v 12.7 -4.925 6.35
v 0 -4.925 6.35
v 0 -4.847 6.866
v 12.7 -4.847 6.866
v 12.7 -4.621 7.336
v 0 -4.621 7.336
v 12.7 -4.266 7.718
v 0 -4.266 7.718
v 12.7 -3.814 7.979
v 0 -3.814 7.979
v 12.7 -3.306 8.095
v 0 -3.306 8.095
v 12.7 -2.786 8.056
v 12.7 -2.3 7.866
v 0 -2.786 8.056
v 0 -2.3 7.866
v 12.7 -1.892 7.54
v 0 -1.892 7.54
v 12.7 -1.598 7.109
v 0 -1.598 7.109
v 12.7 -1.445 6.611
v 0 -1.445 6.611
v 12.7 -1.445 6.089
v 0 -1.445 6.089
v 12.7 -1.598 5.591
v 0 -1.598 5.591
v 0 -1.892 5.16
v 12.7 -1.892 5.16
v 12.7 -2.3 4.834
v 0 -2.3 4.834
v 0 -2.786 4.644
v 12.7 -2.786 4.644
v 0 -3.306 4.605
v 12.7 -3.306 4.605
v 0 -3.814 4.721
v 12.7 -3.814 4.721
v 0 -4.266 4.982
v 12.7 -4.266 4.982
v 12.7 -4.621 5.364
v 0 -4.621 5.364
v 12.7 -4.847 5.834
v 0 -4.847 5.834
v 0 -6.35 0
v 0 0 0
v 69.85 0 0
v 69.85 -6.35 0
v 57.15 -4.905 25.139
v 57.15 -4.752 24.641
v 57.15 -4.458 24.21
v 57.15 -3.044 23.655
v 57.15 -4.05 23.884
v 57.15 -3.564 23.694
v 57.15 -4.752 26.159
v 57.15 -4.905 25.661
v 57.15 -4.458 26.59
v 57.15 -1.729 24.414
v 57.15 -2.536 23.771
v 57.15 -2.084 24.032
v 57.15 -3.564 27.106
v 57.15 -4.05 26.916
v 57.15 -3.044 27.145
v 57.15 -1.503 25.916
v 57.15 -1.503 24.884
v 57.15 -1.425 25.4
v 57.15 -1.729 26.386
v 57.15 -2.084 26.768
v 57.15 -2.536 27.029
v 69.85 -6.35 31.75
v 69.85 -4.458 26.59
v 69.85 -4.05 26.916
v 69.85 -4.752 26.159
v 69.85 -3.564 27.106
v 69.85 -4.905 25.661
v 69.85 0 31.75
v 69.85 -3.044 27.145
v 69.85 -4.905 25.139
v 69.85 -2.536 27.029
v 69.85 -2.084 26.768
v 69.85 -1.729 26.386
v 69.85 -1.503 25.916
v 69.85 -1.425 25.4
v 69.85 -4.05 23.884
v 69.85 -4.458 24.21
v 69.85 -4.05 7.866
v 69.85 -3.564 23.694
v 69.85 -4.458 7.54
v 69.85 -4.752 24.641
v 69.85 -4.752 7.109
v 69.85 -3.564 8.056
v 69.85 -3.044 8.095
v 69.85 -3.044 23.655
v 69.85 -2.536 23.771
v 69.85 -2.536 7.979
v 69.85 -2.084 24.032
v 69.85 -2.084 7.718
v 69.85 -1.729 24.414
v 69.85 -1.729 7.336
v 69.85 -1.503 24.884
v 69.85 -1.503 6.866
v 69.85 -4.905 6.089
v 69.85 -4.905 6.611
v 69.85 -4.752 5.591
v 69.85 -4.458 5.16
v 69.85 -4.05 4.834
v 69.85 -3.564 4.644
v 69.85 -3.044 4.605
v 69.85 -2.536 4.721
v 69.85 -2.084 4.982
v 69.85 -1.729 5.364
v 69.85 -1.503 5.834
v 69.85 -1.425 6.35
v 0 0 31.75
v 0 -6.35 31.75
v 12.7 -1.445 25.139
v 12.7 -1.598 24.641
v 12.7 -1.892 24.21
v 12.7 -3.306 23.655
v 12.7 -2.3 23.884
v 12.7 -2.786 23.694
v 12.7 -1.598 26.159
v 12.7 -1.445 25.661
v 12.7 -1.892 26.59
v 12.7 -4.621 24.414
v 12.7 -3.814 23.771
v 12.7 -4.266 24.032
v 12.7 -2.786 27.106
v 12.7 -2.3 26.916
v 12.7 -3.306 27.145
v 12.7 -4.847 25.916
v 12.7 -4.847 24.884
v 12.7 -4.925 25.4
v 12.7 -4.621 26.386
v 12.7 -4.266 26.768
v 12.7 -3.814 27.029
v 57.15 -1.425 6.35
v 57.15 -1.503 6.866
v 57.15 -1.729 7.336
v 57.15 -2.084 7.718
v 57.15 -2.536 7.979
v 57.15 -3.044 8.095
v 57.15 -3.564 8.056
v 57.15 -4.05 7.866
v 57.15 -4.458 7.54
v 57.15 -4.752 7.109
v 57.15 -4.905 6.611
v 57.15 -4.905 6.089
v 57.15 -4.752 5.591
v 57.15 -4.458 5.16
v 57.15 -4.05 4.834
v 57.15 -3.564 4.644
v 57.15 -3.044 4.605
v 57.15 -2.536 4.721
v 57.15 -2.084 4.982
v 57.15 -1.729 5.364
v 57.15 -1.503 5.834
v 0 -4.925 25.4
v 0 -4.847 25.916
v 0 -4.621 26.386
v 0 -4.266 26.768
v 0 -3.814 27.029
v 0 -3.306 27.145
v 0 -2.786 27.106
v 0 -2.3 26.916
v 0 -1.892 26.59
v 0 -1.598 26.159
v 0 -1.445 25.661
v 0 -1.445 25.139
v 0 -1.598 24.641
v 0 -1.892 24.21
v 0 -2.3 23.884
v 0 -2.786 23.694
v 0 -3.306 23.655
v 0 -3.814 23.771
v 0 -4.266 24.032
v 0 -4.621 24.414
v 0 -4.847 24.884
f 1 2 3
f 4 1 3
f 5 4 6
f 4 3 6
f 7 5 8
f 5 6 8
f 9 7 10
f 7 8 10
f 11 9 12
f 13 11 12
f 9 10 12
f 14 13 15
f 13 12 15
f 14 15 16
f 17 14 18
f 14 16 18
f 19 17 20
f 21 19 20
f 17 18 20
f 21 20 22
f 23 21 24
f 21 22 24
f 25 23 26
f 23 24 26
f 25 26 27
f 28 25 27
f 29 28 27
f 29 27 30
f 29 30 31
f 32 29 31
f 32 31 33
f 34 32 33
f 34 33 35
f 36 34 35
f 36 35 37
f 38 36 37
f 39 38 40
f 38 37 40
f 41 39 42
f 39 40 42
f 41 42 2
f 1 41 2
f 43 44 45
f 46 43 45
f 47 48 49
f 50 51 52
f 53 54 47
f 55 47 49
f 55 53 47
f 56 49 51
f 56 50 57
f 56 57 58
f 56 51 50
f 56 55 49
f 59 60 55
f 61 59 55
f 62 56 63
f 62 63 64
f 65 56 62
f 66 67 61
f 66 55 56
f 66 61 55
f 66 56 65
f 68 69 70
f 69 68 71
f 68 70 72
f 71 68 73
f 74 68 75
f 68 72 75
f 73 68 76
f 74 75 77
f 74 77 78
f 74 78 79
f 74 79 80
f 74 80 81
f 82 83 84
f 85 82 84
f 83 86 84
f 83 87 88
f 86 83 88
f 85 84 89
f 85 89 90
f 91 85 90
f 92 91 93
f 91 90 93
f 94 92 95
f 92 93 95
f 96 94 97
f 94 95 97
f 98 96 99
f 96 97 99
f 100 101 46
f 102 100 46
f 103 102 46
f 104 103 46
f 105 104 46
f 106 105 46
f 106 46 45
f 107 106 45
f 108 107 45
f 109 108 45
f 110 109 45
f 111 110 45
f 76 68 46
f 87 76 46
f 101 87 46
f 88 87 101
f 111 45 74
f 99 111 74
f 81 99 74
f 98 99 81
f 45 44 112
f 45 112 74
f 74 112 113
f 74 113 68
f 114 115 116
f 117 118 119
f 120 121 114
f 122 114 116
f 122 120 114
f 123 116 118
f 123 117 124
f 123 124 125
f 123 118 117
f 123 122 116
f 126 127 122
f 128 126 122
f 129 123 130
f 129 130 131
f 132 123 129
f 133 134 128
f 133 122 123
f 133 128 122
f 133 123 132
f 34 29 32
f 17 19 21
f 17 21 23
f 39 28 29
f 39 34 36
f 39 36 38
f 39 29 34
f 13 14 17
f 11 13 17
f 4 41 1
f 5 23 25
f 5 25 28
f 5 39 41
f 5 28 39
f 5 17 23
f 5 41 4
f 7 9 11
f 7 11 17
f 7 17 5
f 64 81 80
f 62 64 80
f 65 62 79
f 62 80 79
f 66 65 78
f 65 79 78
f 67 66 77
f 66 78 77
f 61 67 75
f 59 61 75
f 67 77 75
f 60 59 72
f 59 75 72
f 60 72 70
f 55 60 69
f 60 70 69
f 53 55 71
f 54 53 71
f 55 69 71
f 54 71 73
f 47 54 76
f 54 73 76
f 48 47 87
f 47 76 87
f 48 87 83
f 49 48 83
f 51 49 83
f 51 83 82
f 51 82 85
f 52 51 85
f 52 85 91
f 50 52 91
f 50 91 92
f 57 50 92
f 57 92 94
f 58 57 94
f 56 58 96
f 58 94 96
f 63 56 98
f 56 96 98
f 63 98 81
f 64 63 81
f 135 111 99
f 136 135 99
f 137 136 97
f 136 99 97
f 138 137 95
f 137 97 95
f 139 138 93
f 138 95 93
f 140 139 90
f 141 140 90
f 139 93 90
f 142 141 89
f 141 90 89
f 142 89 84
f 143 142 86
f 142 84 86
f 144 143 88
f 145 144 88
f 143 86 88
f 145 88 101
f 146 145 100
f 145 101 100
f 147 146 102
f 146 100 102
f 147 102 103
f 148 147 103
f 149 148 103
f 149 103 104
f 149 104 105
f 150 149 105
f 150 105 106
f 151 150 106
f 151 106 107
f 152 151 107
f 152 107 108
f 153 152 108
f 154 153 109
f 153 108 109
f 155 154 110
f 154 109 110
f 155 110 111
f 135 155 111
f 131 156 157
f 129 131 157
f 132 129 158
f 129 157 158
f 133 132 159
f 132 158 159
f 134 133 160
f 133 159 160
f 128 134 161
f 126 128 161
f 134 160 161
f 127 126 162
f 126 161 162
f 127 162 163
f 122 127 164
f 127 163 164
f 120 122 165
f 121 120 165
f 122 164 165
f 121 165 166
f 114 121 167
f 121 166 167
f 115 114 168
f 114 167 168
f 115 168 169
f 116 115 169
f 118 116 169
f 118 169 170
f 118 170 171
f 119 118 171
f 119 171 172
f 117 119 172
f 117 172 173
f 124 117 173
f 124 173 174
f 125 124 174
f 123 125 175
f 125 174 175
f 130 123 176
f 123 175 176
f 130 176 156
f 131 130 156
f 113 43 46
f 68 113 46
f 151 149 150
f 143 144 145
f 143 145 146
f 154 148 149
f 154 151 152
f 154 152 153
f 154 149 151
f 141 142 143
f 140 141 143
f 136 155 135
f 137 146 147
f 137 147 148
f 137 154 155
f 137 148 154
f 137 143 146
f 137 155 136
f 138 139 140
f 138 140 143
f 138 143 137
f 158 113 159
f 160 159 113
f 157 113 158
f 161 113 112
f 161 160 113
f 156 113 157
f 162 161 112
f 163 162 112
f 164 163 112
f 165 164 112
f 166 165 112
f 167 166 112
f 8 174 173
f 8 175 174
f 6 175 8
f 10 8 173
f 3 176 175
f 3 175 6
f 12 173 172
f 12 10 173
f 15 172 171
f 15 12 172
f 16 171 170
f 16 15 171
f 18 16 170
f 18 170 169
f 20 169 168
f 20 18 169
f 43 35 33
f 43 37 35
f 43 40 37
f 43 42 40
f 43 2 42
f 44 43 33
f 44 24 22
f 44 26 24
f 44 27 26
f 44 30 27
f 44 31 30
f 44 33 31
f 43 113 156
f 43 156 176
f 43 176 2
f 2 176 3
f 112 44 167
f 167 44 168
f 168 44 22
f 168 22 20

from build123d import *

# Parameters (mm, degrees)
F0_W     = 69.85
F0_H     = 6.35
F1_DEPTH = 31.75
F2_R     = 1.75
F3_DEPTH = 12.7
F4_R     = 1.75
F5_DEPTH = 12.7


with BuildPart() as f1:
    # F0 (on Top) → F1 (new body)
    with BuildSketch(Plane.XY):
        with Locations((34.925, -3.175)):
            Rectangle(F0_W, F0_H)
    extrude(amount=F1_DEPTH)

    # F2 (on face) → F3 (cut)
    with BuildSketch(Plane.YZ.offset(69.85)):
        with Locations((-3.175, 25.4)):
            Circle(F2_R)
        with Locations((-3.175, 6.35)):
            Circle(F2_R)
    extrude(amount=-F3_DEPTH, mode=Mode.SUBTRACT)

    # F4 (on face) → F5 (cut)
    with BuildSketch(Plane(origin=(0, 0, 0), x_dir=(0, -1, 0), z_dir=(-1, 0, 0))):
        with Locations((3.175, 6.35)):
            Circle(F4_R)
        with Locations((3.175, 25.4)):
            Circle(F4_R)
    extrude(amount=-F5_DEPTH, mode=Mode.SUBTRACT)


solid = f1.part
